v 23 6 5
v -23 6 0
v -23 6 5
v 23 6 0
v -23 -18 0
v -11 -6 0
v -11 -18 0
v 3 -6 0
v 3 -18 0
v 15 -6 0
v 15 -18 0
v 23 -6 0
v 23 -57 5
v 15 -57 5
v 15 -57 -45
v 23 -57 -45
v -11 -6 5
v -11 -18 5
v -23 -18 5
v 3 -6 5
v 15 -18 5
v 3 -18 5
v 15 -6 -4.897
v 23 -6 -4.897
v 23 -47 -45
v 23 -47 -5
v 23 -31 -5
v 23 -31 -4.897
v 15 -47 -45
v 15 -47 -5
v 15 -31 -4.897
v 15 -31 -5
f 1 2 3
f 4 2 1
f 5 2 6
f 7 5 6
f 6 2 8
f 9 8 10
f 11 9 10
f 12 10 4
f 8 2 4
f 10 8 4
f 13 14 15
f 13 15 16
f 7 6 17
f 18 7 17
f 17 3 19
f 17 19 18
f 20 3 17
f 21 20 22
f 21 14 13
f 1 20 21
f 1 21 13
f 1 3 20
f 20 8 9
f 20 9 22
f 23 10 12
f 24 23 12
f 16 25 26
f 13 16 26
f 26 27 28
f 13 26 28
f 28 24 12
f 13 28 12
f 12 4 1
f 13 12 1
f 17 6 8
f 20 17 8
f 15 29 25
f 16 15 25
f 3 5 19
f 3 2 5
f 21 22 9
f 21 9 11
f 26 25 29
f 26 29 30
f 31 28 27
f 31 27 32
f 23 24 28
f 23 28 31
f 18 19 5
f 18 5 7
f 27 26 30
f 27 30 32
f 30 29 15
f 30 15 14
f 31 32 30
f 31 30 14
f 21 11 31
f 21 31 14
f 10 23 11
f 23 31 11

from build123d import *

# Parameters (mm, degrees)
F0_W      = 46
F0_H      = 12
F1_DEPTH  = 5
F2_W      = 8
F2_H      = 50
F3_DEPTH  = 1
F3_FACE_W = 8
F3_FACE_H = 50
F4_DEPTH  = 50
F5_W      = 12
F5_H      = 5
F6_DEPTH  = 12
F7_W      = 12
F7_H      = 5
F8_DEPTH  = 12
F11_W     = 40.896876
F11_H     = 40.029949
F12_DEPTH = 46.001
F13_W     = 8
F13_H     = 40.103398
F14_DEPTH = 25


with BuildPart() as f1:
    # F0 (on Top) → F1 (new body)
    with BuildSketch(Plane.XY):
        Rectangle(F0_W, F0_H)
    extrude(amount=F1_DEPTH)

    # F2 (on face) → F3 (join)
    with BuildSketch(Plane.XZ.offset(6)):
        with Locations((19, -20)):
            Rectangle(F2_W, F2_H)
    extrude(amount=F3_DEPTH)

    # F3_face (on face) → F4 (join)
    with BuildSketch(Plane(origin=(19, -7, -20), x_dir=(1, 0, 0), z_dir=(0, -1, 0))):
        Rectangle(F3_FACE_W, F3_FACE_H)
    extrude(amount=F4_DEPTH)

    # F5 (on face) → F6 (join)
    with BuildSketch(Plane.XZ.offset(6)):
        with Locations((-17, 2.5)):
            Rectangle(F5_W, F5_H)
    extrude(amount=F6_DEPTH)

    # F7 (on face) → F8 (join)
    with BuildSketch(Plane.XZ.offset(6)):
        with Locations((9, 2.5)):
            Rectangle(F7_W, F7_H)
    extrude(amount=F8_DEPTH)

    # F11 (on face) → F12 (cut, through all)
    with BuildSketch(Plane.YZ.offset(23)):
        with Locations((-26.551562, -25.014974)):
            Rectangle(F11_W, F11_H)
    extrude(amount=-F12_DEPTH, mode=Mode.SUBTRACT)

    # F13 (on face) → F14 (cut)
    with BuildSketch(Plane(origin=(0, -6, 0), x_dir=(-1, 0, 0), z_dir=(0, 1, 0))):
        with Locations((-19, -24.948301)):
            Rectangle(F13_W, F13_H)
    extrude(amount=-F14_DEPTH, mode=Mode.SUBTRACT)


solid = f1.part
